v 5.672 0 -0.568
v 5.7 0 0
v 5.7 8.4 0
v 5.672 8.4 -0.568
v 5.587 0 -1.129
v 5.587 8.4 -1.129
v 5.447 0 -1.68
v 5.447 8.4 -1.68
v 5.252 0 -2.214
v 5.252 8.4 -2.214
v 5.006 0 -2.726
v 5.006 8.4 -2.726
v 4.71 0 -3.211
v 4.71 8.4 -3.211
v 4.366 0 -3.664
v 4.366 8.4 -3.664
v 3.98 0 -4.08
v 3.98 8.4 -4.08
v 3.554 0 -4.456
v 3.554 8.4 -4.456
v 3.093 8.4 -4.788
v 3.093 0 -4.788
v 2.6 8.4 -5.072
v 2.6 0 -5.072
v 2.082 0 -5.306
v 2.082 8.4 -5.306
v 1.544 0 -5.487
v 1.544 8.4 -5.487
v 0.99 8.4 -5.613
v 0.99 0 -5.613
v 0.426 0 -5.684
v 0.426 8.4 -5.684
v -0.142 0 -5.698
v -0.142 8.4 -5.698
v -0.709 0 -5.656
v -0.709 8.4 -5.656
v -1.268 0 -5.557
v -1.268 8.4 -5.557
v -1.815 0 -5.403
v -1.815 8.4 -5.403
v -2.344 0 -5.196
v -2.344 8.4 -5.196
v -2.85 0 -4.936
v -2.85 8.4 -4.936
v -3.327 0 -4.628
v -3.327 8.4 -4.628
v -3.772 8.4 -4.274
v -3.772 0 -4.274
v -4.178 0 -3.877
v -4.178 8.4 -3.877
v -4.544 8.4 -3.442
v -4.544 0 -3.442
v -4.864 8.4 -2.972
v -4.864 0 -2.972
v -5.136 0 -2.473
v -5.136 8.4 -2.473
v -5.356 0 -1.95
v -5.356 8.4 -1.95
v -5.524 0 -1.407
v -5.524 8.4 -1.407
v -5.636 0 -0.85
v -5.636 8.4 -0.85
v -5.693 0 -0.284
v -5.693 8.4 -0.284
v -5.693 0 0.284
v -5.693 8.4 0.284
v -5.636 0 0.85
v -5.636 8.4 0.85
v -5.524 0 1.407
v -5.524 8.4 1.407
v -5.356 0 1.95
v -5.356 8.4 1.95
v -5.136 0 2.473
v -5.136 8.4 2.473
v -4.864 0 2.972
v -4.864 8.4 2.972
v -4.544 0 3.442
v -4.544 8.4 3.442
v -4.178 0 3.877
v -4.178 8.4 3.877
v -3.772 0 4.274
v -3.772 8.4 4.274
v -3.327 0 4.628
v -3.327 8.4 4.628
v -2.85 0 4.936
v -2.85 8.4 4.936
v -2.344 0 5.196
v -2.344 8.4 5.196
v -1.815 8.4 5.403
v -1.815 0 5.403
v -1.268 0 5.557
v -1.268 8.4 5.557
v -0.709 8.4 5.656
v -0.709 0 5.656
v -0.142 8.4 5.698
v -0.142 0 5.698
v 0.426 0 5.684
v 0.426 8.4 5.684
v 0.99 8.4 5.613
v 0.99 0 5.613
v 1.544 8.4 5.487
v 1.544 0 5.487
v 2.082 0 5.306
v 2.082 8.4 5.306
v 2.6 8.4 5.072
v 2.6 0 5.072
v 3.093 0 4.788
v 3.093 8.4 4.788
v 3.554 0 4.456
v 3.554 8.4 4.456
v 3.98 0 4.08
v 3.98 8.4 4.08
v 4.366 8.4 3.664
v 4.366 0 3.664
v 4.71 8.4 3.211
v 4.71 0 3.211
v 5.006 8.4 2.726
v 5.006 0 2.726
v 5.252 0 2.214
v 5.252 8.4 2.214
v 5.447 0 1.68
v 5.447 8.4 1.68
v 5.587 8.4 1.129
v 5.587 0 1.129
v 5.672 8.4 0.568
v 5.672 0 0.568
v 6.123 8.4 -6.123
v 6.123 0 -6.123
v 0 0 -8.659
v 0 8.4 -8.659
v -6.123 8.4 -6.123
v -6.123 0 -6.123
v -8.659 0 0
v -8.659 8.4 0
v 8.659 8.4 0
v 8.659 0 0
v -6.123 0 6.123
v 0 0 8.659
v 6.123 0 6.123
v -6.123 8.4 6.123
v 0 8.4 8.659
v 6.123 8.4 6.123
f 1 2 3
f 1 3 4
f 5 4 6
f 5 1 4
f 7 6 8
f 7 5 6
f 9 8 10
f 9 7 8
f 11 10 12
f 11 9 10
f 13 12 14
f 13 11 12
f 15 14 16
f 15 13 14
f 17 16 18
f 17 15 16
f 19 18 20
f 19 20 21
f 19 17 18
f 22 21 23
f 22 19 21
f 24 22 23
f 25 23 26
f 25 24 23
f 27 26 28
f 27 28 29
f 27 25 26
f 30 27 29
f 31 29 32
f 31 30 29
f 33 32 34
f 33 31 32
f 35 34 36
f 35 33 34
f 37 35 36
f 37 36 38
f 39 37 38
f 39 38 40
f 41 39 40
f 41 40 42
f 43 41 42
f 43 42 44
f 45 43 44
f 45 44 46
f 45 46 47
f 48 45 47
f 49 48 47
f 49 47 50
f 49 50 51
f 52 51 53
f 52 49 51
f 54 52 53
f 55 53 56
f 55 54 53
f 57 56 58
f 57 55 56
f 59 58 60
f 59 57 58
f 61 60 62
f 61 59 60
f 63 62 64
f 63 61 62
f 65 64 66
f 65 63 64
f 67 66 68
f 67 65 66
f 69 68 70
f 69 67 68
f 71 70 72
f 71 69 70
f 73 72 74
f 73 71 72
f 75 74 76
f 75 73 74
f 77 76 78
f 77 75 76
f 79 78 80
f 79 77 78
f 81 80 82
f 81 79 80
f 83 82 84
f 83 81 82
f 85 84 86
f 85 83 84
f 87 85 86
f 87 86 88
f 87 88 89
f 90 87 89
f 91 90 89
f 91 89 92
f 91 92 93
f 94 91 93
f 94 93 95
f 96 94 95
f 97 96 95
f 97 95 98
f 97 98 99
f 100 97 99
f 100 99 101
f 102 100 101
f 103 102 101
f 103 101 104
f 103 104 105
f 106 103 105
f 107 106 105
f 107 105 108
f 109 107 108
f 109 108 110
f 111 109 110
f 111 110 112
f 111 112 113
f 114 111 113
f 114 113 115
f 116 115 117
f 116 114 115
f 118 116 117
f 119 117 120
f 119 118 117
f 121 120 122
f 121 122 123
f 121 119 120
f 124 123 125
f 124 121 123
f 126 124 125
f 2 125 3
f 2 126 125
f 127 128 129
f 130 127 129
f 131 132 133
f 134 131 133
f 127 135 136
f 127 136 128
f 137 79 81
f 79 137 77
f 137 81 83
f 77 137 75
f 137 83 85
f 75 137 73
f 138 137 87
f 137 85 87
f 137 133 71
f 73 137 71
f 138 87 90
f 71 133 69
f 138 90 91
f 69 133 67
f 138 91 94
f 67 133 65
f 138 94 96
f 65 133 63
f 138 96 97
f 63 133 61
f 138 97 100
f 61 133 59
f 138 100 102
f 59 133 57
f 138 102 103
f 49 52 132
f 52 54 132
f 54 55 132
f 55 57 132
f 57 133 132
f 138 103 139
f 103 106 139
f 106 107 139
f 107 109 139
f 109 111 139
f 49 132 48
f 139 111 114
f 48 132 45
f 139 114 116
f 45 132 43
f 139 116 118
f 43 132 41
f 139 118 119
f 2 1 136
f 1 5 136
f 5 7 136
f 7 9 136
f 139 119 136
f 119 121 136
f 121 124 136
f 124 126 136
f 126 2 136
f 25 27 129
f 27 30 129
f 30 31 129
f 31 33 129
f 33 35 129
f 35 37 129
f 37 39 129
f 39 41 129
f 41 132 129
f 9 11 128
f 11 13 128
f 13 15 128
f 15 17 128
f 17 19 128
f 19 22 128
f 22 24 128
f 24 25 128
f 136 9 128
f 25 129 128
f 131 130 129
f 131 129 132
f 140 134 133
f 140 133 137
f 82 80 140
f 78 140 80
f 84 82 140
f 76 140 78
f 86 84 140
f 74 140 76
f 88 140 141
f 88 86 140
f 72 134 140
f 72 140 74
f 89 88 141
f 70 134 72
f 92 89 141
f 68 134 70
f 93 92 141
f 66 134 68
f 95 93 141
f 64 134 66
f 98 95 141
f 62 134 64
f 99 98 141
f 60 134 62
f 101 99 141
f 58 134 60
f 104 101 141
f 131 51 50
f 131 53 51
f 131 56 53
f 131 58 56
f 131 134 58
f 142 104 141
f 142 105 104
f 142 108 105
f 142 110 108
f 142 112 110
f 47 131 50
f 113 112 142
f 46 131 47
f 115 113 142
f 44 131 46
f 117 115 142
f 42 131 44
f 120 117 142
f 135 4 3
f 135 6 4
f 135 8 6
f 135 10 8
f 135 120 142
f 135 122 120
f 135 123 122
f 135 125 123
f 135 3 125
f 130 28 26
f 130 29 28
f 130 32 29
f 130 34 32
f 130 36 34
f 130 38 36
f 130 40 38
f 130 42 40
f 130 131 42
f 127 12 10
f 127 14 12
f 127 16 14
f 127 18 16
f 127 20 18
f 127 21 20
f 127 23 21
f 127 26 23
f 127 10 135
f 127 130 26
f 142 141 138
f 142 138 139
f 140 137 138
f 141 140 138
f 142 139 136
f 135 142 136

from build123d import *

# Parameters (mm, degrees)
SKETCH1_R           = 5.7
BOSS_EXTRUDE1_DEPTH = 8.4


with BuildPart() as part:
    # Sketch1 → Boss-Extrude1 (new body)
    with BuildSketch(Plane(origin=(0, 0, 0), x_dir=(1, 0, 0), z_dir=(0, 1, 0))):
        Polygon((8.659137602, 0), (6.122934918, 6.122934918), (0, 8.659137602), (-6.122934918, 6.122934918), (-8.659137602, 0), (-6.122934918, -6.122934918), (0, -8.659137602), (6.122934918, -6.122934918), align=None)
        Circle(SKETCH1_R, mode=Mode.SUBTRACT)
    extrude(amount=BOSS_EXTRUDE1_DEPTH)


solid = part.part
